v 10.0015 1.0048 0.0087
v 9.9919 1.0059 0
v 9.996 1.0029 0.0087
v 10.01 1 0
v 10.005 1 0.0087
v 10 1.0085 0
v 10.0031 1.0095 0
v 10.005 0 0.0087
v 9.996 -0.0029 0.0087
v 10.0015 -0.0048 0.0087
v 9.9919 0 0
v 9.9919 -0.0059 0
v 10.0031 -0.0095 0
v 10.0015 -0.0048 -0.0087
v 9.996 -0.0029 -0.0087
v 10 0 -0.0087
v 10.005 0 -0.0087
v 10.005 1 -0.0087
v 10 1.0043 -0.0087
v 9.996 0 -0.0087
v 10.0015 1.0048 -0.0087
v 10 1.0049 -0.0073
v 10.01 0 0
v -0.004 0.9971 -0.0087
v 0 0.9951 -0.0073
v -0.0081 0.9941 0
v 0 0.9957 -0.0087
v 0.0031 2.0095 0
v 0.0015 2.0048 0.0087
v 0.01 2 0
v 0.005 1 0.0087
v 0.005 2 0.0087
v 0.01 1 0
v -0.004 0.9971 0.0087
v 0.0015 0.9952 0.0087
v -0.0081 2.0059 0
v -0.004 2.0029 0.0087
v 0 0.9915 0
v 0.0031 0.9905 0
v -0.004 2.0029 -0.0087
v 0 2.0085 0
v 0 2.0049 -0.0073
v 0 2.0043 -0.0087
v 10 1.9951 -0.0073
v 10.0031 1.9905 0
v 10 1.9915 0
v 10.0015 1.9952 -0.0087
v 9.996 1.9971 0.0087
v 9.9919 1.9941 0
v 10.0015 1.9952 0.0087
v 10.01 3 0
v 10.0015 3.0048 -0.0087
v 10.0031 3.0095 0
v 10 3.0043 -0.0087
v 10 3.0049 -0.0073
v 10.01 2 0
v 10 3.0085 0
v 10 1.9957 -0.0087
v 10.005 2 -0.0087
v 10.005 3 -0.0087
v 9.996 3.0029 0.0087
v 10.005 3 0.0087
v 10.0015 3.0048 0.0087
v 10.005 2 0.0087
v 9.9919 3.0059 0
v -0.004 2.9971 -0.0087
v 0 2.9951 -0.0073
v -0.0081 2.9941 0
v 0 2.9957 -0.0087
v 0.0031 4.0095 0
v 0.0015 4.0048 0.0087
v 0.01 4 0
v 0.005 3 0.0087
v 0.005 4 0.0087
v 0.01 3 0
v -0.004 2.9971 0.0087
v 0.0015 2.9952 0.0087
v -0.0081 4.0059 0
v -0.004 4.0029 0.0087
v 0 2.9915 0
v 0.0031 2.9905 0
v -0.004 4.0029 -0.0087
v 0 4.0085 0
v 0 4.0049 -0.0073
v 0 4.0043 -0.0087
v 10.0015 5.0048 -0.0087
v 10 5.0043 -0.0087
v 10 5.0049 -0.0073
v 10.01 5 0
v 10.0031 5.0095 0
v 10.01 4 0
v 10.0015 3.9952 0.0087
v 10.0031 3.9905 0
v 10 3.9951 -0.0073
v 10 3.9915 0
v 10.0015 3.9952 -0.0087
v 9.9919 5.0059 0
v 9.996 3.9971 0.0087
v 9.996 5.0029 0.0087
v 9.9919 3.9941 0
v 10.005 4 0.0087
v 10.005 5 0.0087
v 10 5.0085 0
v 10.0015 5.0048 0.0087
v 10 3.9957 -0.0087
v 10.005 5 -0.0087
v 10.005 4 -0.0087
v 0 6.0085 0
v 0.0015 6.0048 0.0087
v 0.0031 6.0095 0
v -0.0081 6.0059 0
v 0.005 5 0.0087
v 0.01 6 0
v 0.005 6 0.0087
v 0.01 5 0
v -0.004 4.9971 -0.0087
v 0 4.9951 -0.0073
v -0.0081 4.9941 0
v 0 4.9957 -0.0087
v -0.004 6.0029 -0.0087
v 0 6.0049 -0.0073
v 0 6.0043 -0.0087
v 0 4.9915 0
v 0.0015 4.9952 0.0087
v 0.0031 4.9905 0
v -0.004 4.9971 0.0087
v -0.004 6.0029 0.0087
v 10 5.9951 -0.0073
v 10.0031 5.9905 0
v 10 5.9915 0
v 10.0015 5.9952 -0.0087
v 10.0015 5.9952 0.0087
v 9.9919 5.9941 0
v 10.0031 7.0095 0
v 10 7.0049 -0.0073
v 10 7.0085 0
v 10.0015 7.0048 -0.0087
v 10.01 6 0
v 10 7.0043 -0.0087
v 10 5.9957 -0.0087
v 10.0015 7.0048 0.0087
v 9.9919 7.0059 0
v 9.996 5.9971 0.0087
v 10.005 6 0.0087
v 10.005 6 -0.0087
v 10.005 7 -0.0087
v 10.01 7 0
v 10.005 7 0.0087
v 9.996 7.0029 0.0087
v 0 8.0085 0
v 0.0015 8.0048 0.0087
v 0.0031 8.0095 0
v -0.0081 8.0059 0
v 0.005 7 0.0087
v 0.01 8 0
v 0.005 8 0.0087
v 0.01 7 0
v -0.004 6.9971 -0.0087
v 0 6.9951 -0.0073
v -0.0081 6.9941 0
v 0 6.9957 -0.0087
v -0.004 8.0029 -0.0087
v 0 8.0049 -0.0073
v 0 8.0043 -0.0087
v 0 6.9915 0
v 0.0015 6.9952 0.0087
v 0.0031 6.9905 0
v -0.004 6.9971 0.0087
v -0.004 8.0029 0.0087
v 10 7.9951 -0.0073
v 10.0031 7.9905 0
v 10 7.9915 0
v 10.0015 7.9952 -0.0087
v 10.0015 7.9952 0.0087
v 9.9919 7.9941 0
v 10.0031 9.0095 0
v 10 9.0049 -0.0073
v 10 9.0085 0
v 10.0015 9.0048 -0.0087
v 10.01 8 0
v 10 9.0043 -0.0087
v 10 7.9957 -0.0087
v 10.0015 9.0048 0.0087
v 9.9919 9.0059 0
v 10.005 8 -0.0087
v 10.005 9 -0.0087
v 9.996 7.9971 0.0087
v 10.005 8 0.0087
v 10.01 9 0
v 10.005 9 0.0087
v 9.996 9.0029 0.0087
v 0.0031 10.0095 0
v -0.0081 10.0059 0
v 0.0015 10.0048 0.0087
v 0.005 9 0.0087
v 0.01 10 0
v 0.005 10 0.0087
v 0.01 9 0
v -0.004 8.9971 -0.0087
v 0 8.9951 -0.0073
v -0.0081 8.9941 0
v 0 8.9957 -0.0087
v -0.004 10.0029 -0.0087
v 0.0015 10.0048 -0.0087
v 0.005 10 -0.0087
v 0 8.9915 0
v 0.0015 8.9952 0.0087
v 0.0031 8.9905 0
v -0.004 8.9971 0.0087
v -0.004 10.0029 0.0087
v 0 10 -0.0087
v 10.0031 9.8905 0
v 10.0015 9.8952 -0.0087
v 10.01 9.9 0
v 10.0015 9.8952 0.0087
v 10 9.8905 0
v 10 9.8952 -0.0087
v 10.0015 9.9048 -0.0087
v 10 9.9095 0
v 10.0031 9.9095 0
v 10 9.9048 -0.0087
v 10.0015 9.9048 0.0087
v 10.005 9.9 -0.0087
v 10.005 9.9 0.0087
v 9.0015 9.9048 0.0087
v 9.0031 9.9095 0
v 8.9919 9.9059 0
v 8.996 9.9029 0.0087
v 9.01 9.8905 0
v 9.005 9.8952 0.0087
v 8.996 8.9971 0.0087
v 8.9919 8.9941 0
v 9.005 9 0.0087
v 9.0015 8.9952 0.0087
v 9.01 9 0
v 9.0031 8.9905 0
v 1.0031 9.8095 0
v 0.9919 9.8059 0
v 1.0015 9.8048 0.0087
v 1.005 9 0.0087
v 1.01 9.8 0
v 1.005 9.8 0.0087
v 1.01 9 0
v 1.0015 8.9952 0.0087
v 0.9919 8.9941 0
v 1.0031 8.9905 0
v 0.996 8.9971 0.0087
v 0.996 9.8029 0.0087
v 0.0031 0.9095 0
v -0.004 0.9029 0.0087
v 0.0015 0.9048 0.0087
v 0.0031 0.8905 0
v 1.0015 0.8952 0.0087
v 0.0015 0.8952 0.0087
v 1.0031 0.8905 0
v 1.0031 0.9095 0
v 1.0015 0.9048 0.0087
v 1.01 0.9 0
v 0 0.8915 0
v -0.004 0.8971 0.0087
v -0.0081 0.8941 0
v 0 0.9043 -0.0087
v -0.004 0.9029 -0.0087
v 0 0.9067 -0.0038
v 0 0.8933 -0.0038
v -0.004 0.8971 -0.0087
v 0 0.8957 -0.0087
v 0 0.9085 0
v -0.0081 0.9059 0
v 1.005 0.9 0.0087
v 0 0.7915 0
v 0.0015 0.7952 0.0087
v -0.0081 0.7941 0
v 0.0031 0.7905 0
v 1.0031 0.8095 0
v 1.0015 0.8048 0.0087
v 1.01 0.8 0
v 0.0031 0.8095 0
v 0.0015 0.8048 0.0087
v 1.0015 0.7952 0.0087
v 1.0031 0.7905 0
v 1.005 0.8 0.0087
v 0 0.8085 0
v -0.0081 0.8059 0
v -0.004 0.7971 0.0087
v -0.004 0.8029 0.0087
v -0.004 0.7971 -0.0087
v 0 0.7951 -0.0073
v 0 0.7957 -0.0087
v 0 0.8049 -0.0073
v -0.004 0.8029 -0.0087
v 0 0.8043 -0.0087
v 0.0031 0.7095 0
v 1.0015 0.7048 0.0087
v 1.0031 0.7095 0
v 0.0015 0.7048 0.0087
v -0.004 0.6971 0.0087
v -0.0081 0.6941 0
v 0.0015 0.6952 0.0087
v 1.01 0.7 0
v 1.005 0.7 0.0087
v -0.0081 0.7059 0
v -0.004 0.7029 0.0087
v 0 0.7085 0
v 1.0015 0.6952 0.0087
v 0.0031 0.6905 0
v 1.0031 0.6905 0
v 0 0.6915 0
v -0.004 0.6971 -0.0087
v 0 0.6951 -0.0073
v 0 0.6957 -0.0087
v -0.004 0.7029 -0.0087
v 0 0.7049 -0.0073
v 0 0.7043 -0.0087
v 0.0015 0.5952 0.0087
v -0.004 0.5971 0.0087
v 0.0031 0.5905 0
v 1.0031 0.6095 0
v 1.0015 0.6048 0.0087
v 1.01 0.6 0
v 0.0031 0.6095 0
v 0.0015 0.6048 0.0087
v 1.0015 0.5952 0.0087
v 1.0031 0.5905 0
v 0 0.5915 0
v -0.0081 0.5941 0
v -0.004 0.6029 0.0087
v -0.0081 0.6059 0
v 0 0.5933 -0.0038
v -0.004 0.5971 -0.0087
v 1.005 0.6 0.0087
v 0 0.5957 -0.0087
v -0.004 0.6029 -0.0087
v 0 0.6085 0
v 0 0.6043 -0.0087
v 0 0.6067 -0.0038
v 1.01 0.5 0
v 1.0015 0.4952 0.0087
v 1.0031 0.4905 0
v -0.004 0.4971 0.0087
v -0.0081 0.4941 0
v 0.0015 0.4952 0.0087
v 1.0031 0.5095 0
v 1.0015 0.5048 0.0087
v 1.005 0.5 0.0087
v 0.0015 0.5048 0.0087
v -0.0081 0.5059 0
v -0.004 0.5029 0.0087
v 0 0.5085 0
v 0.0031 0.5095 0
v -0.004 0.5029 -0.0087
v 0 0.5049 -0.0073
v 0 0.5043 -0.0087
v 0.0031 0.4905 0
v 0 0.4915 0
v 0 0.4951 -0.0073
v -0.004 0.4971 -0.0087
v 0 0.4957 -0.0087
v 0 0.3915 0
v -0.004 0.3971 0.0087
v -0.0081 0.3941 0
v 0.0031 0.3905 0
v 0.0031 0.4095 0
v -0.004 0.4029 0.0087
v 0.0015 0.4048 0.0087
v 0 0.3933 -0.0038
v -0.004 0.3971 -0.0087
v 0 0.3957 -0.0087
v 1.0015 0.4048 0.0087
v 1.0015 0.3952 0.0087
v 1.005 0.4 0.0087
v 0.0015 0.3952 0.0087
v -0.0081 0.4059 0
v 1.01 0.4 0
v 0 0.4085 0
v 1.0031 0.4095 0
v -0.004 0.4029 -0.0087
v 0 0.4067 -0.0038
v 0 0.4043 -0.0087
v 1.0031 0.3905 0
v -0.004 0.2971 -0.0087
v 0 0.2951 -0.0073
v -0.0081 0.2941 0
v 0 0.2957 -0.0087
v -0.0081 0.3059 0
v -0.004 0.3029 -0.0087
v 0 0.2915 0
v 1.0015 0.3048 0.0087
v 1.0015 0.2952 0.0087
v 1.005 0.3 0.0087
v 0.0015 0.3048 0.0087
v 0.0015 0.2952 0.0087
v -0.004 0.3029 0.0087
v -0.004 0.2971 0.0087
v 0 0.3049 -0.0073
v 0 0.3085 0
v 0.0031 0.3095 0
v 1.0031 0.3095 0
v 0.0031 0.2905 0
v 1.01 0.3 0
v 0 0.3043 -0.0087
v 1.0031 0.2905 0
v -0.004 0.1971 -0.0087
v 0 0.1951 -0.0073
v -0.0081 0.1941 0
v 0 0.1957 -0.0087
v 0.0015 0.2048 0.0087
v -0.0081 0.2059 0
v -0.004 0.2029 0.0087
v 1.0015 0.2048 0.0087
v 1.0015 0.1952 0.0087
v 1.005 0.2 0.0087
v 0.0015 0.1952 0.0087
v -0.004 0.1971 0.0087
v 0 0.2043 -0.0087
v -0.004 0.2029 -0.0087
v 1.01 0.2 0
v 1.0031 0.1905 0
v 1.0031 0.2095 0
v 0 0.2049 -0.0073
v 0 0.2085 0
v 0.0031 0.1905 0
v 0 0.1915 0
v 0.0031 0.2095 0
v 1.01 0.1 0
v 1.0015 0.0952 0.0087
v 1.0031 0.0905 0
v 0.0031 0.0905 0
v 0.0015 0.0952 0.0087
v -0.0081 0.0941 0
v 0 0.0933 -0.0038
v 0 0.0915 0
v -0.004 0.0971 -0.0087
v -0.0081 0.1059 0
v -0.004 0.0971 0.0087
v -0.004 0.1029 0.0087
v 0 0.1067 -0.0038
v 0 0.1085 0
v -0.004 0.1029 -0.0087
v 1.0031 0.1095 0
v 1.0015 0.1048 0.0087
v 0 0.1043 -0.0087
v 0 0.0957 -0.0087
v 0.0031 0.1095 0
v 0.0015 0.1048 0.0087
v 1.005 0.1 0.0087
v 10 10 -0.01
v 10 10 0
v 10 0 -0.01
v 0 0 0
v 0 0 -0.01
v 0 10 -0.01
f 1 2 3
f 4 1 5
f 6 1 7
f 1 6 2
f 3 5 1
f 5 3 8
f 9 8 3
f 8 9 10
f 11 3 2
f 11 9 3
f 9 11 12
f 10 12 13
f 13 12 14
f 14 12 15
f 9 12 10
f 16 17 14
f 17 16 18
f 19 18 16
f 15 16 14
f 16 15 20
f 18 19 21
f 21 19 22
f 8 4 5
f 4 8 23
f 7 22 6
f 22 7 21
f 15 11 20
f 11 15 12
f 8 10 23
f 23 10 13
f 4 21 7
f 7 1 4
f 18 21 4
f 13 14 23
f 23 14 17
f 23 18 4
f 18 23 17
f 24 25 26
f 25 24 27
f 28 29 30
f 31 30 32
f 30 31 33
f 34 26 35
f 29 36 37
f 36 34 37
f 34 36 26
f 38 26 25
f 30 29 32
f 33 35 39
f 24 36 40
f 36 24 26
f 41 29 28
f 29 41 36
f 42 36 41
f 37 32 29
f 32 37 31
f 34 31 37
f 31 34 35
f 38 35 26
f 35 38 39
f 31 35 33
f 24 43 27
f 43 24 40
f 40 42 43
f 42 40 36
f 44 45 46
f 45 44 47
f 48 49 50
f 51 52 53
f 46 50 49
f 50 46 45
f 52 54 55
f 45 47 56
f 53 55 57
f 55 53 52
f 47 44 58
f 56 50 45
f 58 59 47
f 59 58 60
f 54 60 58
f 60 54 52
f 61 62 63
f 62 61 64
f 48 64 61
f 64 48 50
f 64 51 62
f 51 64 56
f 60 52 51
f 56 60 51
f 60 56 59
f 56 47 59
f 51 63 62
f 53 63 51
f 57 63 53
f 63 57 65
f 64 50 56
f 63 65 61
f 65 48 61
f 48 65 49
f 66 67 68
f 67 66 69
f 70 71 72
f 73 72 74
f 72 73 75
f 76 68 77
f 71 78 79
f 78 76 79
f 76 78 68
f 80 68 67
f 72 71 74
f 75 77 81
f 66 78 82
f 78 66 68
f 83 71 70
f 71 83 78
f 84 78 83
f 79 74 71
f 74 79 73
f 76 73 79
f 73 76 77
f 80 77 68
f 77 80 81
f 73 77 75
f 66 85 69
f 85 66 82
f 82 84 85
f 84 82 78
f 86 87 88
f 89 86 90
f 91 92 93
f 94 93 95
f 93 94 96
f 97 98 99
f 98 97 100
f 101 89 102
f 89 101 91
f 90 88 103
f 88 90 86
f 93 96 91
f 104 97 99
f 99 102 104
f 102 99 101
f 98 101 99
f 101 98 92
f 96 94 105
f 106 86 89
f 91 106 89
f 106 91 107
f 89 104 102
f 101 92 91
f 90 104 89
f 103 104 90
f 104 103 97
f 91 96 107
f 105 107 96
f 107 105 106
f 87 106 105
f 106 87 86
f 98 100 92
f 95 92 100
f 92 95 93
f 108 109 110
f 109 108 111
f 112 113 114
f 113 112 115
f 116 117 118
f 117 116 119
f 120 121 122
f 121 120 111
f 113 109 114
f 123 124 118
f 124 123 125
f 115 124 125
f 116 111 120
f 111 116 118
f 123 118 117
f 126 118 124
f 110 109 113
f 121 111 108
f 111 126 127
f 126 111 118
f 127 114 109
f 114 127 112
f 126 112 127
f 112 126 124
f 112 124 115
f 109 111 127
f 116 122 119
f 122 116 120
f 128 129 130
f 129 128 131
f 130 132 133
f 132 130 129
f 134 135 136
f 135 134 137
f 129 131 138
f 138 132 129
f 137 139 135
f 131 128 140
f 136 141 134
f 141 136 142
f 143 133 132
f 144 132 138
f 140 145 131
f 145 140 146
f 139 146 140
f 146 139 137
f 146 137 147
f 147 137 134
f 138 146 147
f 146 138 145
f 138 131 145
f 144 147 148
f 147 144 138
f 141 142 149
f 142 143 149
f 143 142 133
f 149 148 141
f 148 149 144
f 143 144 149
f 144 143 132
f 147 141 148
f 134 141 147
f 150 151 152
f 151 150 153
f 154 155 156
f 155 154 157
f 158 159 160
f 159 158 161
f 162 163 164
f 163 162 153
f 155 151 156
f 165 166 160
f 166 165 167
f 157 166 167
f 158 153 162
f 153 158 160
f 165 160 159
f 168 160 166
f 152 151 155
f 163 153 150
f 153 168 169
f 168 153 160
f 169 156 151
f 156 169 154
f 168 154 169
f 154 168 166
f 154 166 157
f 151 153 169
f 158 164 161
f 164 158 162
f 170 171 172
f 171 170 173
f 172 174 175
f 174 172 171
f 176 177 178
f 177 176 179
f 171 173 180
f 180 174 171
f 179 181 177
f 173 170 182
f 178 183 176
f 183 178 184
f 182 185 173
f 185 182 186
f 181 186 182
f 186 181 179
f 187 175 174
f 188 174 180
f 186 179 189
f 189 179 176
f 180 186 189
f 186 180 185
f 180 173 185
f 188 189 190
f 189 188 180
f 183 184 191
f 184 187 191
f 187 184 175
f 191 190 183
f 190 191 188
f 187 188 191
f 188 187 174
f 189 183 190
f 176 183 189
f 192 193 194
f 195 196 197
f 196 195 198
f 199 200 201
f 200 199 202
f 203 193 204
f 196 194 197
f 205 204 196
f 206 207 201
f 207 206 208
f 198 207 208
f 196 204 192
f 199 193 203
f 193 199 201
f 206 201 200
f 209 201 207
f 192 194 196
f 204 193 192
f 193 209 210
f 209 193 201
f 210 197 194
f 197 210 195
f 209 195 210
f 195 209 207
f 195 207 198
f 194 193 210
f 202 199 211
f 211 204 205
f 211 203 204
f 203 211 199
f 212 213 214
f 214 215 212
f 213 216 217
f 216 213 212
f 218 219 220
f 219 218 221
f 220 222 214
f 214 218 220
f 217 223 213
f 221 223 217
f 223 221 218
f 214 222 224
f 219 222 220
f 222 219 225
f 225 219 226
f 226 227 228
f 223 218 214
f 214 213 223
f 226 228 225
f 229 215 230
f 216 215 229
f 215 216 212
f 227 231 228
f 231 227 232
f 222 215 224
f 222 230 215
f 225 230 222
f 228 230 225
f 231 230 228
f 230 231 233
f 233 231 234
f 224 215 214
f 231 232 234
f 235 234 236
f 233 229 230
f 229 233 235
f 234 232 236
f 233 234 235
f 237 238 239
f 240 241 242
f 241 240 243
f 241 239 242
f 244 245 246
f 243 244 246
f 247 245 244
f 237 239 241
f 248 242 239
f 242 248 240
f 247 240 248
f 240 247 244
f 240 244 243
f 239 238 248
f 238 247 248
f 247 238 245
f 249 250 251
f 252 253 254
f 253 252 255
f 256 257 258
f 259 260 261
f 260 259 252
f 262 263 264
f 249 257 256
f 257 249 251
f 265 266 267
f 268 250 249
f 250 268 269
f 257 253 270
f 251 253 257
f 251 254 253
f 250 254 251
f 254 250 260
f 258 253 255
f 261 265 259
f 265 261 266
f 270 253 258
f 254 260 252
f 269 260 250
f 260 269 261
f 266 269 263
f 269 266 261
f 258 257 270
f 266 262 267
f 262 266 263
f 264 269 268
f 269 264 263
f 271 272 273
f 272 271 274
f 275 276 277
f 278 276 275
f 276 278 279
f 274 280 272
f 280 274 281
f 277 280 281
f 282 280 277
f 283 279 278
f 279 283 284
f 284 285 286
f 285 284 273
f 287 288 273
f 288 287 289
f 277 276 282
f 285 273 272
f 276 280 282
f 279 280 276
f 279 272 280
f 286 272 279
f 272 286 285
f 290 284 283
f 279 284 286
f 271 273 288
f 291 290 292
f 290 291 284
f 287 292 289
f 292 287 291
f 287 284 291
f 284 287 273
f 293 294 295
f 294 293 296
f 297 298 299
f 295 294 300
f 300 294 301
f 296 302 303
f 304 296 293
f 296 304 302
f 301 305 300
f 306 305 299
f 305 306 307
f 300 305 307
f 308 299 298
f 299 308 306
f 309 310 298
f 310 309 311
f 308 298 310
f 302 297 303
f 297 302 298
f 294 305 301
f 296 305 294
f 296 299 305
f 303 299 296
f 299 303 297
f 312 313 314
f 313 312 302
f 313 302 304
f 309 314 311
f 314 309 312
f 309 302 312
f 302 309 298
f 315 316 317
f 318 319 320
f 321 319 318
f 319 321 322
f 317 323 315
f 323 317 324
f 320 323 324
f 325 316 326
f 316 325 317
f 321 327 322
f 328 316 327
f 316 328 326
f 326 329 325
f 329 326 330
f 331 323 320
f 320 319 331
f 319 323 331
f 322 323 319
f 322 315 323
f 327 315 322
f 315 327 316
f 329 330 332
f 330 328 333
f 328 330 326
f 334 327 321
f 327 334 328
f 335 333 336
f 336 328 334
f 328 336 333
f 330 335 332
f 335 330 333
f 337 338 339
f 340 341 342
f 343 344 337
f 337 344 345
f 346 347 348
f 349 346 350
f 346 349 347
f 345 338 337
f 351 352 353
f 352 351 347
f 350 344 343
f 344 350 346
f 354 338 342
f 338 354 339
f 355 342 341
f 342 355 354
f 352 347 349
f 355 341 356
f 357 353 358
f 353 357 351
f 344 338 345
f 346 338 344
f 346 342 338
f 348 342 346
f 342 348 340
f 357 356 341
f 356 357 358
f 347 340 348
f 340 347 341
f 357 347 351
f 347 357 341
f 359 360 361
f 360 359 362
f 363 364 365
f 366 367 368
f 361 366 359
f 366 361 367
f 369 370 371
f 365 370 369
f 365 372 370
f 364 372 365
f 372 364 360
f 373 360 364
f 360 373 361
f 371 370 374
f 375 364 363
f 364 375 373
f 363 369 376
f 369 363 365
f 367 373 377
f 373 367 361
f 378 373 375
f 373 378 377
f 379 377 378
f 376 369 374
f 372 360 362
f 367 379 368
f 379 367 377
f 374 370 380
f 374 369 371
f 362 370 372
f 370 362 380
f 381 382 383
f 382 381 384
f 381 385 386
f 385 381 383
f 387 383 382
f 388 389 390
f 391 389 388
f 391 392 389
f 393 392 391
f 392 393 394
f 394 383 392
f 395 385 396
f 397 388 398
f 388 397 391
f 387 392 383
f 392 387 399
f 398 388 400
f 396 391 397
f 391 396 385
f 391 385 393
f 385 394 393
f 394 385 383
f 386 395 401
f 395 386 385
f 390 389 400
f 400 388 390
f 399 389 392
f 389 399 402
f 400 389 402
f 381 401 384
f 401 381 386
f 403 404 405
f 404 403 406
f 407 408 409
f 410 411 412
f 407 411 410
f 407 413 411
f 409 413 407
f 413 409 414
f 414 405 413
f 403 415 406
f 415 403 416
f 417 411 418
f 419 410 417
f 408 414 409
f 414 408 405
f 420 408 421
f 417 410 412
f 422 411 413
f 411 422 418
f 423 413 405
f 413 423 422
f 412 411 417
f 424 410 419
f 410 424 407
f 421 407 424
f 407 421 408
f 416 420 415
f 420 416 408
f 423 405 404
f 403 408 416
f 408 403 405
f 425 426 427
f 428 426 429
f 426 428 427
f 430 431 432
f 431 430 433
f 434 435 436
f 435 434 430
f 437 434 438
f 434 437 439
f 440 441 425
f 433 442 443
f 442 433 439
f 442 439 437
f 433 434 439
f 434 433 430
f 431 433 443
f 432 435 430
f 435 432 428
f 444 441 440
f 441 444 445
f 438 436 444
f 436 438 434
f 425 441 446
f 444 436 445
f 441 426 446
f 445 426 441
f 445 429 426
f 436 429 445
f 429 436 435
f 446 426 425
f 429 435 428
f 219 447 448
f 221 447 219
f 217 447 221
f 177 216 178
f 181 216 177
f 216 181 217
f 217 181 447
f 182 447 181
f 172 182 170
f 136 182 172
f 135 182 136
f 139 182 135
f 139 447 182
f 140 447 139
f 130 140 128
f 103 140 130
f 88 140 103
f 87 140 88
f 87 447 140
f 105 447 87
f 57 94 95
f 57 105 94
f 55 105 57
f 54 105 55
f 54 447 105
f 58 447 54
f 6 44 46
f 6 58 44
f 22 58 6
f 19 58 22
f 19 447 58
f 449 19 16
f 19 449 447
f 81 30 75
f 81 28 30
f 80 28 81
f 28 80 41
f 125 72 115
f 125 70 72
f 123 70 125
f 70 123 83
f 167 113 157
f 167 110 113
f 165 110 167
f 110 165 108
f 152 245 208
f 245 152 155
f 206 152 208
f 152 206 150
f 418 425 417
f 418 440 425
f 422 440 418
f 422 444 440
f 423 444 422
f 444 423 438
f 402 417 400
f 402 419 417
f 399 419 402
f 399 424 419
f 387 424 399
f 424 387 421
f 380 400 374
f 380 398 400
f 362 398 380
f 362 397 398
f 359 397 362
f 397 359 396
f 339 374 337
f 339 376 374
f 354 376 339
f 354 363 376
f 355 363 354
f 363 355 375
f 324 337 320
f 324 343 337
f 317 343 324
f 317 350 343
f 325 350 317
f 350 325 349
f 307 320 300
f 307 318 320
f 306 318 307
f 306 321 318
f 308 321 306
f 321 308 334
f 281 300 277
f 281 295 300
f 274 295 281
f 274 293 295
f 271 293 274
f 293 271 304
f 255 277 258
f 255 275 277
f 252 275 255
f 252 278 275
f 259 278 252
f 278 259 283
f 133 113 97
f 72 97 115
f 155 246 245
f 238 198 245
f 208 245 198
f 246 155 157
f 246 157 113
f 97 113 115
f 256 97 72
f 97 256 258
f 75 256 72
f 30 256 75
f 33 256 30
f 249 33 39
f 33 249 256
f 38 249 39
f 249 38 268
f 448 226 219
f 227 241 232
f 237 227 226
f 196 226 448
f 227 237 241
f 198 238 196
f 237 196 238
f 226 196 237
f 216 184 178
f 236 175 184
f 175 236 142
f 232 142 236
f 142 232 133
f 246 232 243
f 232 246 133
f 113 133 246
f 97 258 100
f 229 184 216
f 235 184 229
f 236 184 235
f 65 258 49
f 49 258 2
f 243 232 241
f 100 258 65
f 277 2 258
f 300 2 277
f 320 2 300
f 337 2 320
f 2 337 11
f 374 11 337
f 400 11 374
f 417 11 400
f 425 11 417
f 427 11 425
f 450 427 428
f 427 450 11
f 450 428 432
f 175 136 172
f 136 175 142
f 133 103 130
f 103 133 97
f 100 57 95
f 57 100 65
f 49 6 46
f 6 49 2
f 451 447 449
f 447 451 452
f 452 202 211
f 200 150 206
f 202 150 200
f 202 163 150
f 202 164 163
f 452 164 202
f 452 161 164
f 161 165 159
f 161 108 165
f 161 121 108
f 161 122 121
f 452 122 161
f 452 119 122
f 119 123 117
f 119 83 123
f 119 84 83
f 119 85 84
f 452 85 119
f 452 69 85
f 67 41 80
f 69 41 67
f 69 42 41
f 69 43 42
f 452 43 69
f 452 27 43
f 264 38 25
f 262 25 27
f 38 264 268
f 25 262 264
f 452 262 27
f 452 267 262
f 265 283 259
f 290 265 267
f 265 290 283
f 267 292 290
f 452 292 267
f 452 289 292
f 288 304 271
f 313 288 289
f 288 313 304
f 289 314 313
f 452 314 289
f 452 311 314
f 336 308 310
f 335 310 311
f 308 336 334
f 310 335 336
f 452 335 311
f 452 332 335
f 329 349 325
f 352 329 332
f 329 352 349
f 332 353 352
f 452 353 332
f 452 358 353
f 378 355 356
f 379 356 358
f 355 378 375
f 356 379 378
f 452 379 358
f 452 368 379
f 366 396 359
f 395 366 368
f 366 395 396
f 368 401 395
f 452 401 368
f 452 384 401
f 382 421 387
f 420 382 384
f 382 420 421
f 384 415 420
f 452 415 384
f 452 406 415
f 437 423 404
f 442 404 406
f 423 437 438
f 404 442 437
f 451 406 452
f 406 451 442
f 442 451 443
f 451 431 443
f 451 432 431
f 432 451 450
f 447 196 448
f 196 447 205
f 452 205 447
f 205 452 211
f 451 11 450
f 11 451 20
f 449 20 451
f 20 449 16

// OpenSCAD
hull(){
    translate([10.0, 0.0]) sphere(0.01);
    translate([10.0, 1.0]) sphere(0.01);
}
hull(){
    translate([0.0, 1.0]) sphere(0.01);
    translate([0.0, 2.0]) sphere(0.01);
}
hull(){
    translate([10.0, 2.0]) sphere(0.01);
    translate([10.0, 3.0]) sphere(0.01);
}
hull(){
    translate([0.0, 3.0]) sphere(0.01);
    translate([0.0, 4.0]) sphere(0.01);
}
hull(){
    translate([10.0, 4.0]) sphere(0.01);
    translate([10.0, 5.0]) sphere(0.01);
}
hull(){
    translate([0.0, 5.0]) sphere(0.01);
    translate([0.0, 6.0]) sphere(0.01);
}
hull(){
    translate([10.0, 6.0]) sphere(0.01);
    translate([10.0, 7.0]) sphere(0.01);
}
hull(){
    translate([0.0, 7.0]) sphere(0.01);
    translate([0.0, 8.0]) sphere(0.01);
}
hull(){
    translate([10.0, 8.0]) sphere(0.01);
    translate([10.0, 9.0]) sphere(0.01);
}
hull(){
    translate([0.0, 9.0]) sphere(0.01);
    translate([0.0, 10.0]) sphere(0.01);
}
hull(){
    translate([10.0, 9.9]) sphere(0.01);
    translate([9.0, 9.9]) sphere(0.01);
}
hull(){
    translate([9.0, 9.9]) sphere(0.01);
    translate([9.0, 9.0]) sphere(0.01);
}
hull(){
    translate([1.0, 9.0]) sphere(0.01);
    translate([1.0, 9.8]) sphere(0.01);
}
hull(){
    translate([9.0, 9.8]) sphere(0.01);
    translate([9.0, 9.1]) sphere(0.01);
}
hull(){
    translate([1.0, 9.1]) sphere(0.01);
    translate([1.0, 9.7]) sphere(0.01);
}
hull(){
    translate([1.0, 0.9]) sphere(0.01);
    translate([0.0, 0.9]) sphere(0.01);
}
hull(){
    translate([0.0, 0.8]) sphere(0.01);
    translate([1.0, 0.8]) sphere(0.01);
}
hull(){
    translate([1.0, 0.7]) sphere(0.01);
    translate([0.0, 0.7]) sphere(0.01);
}
hull(){
    translate([0.0, 0.6]) sphere(0.01);
    translate([1.0, 0.6]) sphere(0.01);
}
hull(){
    translate([1.0, 0.5]) sphere(0.01);
    translate([0.0, 0.5]) sphere(0.01);
}
hull(){
    translate([0.0, 0.4]) sphere(0.01);
    translate([1.0, 0.4]) sphere(0.01);
}
hull(){
    translate([1.0, 0.3]) sphere(0.01);
    translate([0.0, 0.3]) sphere(0.01);
}
hull(){
    translate([0.0, 0.2]) sphere(0.01);
    translate([1.0, 0.2]) sphere(0.01);
}
hull(){
    translate([1.0, 0.1]) sphere(0.01);
    translate([0.0, 0.1]) sphere(0.01);
}
translate([0,0,-0.01]) color([0.1,0.1,0.1]) cube([10,10,0.01]);
